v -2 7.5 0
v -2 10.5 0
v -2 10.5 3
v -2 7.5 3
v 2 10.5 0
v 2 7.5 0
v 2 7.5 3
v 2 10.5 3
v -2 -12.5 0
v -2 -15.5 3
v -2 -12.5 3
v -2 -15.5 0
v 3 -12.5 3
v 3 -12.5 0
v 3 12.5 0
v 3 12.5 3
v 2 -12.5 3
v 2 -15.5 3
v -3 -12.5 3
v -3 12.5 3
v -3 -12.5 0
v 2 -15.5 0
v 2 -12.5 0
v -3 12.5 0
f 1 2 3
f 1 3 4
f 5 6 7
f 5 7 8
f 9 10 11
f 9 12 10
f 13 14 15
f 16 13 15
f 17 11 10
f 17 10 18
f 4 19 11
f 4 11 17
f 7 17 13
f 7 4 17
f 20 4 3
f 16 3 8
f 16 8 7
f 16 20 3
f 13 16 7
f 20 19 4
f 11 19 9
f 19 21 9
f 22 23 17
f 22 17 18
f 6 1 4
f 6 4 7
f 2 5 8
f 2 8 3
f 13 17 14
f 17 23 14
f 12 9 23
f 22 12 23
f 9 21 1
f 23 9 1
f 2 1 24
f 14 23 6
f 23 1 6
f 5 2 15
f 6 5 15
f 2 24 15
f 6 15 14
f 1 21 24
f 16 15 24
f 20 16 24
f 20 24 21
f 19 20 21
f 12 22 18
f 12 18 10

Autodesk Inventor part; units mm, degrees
ref_plane "YZ Plane" through (0, 0, 0) normal (1, 0, 0) x (0, 1, 0)
ref_plane "XZ Plane" through (0, 0, 0) normal (0, 1, 0) x (-1, 0, 0)
ref_plane "XY Plane" through (0, 0, 0) normal (0, 0, 1) x (1, 0, 0)
sketch "Sketch1" plane through (0, 0, 0) normal (0, 0, 1) x (1, 0, 0)
  line L0 (-3, -12.5) -> (3, -12.5)
  line L1 (3, -12.5) -> (3, 12.5)
  line L2 (3, 12.5) -> (-3, 12.5)
  line L3 (-3, 12.5) -> (-3, -12.5)
  line L4 (-3, -12.5) -> (3, 12.5) construction
  line L5 (3, -12.5) -> (-3, 12.5) construction
  line L6 (-2, -12.5) -> (2, -12.5)
  line L7 (2, -12.5) -> (2, -15.5)
  line L8 (2, -15.5) -> (-2, -15.5)
  line L9 (-2, -15.5) -> (-2, -12.5)
  line L10 (-2, 7.5) -> (2, 7.5)
  line L11 (2, 7.5) -> (2, 10.5)
  line L12 (2, 10.5) -> (-2, 10.5)
  line L13 (-2, 10.5) -> (-2, 7.5)
  line L14 (-2, 7.5) -> (2, 10.5) construction
  line L15 (2, 7.5) -> (-2, 10.5) construction
  point P0 (0, 0)
  point P1 (0, -15.5)
  point P2 (0, -12.5)
  point P3 (0, 9)
  point P4 (0, 10.5)
  point P5 (0, 12.5)
  dimension "d0" = 25
  dimension "d1" = 6
  dimension "d2" = 3
  dimension "d3" = 4
  dimension "d6" = 4
  dimension "d7" = 3
  dimension "d8" = 2
extrude "Extrusion1" add sketch "Sketch1" along normal blind 3
properties material "MDF Medium Density Fiberboard"
